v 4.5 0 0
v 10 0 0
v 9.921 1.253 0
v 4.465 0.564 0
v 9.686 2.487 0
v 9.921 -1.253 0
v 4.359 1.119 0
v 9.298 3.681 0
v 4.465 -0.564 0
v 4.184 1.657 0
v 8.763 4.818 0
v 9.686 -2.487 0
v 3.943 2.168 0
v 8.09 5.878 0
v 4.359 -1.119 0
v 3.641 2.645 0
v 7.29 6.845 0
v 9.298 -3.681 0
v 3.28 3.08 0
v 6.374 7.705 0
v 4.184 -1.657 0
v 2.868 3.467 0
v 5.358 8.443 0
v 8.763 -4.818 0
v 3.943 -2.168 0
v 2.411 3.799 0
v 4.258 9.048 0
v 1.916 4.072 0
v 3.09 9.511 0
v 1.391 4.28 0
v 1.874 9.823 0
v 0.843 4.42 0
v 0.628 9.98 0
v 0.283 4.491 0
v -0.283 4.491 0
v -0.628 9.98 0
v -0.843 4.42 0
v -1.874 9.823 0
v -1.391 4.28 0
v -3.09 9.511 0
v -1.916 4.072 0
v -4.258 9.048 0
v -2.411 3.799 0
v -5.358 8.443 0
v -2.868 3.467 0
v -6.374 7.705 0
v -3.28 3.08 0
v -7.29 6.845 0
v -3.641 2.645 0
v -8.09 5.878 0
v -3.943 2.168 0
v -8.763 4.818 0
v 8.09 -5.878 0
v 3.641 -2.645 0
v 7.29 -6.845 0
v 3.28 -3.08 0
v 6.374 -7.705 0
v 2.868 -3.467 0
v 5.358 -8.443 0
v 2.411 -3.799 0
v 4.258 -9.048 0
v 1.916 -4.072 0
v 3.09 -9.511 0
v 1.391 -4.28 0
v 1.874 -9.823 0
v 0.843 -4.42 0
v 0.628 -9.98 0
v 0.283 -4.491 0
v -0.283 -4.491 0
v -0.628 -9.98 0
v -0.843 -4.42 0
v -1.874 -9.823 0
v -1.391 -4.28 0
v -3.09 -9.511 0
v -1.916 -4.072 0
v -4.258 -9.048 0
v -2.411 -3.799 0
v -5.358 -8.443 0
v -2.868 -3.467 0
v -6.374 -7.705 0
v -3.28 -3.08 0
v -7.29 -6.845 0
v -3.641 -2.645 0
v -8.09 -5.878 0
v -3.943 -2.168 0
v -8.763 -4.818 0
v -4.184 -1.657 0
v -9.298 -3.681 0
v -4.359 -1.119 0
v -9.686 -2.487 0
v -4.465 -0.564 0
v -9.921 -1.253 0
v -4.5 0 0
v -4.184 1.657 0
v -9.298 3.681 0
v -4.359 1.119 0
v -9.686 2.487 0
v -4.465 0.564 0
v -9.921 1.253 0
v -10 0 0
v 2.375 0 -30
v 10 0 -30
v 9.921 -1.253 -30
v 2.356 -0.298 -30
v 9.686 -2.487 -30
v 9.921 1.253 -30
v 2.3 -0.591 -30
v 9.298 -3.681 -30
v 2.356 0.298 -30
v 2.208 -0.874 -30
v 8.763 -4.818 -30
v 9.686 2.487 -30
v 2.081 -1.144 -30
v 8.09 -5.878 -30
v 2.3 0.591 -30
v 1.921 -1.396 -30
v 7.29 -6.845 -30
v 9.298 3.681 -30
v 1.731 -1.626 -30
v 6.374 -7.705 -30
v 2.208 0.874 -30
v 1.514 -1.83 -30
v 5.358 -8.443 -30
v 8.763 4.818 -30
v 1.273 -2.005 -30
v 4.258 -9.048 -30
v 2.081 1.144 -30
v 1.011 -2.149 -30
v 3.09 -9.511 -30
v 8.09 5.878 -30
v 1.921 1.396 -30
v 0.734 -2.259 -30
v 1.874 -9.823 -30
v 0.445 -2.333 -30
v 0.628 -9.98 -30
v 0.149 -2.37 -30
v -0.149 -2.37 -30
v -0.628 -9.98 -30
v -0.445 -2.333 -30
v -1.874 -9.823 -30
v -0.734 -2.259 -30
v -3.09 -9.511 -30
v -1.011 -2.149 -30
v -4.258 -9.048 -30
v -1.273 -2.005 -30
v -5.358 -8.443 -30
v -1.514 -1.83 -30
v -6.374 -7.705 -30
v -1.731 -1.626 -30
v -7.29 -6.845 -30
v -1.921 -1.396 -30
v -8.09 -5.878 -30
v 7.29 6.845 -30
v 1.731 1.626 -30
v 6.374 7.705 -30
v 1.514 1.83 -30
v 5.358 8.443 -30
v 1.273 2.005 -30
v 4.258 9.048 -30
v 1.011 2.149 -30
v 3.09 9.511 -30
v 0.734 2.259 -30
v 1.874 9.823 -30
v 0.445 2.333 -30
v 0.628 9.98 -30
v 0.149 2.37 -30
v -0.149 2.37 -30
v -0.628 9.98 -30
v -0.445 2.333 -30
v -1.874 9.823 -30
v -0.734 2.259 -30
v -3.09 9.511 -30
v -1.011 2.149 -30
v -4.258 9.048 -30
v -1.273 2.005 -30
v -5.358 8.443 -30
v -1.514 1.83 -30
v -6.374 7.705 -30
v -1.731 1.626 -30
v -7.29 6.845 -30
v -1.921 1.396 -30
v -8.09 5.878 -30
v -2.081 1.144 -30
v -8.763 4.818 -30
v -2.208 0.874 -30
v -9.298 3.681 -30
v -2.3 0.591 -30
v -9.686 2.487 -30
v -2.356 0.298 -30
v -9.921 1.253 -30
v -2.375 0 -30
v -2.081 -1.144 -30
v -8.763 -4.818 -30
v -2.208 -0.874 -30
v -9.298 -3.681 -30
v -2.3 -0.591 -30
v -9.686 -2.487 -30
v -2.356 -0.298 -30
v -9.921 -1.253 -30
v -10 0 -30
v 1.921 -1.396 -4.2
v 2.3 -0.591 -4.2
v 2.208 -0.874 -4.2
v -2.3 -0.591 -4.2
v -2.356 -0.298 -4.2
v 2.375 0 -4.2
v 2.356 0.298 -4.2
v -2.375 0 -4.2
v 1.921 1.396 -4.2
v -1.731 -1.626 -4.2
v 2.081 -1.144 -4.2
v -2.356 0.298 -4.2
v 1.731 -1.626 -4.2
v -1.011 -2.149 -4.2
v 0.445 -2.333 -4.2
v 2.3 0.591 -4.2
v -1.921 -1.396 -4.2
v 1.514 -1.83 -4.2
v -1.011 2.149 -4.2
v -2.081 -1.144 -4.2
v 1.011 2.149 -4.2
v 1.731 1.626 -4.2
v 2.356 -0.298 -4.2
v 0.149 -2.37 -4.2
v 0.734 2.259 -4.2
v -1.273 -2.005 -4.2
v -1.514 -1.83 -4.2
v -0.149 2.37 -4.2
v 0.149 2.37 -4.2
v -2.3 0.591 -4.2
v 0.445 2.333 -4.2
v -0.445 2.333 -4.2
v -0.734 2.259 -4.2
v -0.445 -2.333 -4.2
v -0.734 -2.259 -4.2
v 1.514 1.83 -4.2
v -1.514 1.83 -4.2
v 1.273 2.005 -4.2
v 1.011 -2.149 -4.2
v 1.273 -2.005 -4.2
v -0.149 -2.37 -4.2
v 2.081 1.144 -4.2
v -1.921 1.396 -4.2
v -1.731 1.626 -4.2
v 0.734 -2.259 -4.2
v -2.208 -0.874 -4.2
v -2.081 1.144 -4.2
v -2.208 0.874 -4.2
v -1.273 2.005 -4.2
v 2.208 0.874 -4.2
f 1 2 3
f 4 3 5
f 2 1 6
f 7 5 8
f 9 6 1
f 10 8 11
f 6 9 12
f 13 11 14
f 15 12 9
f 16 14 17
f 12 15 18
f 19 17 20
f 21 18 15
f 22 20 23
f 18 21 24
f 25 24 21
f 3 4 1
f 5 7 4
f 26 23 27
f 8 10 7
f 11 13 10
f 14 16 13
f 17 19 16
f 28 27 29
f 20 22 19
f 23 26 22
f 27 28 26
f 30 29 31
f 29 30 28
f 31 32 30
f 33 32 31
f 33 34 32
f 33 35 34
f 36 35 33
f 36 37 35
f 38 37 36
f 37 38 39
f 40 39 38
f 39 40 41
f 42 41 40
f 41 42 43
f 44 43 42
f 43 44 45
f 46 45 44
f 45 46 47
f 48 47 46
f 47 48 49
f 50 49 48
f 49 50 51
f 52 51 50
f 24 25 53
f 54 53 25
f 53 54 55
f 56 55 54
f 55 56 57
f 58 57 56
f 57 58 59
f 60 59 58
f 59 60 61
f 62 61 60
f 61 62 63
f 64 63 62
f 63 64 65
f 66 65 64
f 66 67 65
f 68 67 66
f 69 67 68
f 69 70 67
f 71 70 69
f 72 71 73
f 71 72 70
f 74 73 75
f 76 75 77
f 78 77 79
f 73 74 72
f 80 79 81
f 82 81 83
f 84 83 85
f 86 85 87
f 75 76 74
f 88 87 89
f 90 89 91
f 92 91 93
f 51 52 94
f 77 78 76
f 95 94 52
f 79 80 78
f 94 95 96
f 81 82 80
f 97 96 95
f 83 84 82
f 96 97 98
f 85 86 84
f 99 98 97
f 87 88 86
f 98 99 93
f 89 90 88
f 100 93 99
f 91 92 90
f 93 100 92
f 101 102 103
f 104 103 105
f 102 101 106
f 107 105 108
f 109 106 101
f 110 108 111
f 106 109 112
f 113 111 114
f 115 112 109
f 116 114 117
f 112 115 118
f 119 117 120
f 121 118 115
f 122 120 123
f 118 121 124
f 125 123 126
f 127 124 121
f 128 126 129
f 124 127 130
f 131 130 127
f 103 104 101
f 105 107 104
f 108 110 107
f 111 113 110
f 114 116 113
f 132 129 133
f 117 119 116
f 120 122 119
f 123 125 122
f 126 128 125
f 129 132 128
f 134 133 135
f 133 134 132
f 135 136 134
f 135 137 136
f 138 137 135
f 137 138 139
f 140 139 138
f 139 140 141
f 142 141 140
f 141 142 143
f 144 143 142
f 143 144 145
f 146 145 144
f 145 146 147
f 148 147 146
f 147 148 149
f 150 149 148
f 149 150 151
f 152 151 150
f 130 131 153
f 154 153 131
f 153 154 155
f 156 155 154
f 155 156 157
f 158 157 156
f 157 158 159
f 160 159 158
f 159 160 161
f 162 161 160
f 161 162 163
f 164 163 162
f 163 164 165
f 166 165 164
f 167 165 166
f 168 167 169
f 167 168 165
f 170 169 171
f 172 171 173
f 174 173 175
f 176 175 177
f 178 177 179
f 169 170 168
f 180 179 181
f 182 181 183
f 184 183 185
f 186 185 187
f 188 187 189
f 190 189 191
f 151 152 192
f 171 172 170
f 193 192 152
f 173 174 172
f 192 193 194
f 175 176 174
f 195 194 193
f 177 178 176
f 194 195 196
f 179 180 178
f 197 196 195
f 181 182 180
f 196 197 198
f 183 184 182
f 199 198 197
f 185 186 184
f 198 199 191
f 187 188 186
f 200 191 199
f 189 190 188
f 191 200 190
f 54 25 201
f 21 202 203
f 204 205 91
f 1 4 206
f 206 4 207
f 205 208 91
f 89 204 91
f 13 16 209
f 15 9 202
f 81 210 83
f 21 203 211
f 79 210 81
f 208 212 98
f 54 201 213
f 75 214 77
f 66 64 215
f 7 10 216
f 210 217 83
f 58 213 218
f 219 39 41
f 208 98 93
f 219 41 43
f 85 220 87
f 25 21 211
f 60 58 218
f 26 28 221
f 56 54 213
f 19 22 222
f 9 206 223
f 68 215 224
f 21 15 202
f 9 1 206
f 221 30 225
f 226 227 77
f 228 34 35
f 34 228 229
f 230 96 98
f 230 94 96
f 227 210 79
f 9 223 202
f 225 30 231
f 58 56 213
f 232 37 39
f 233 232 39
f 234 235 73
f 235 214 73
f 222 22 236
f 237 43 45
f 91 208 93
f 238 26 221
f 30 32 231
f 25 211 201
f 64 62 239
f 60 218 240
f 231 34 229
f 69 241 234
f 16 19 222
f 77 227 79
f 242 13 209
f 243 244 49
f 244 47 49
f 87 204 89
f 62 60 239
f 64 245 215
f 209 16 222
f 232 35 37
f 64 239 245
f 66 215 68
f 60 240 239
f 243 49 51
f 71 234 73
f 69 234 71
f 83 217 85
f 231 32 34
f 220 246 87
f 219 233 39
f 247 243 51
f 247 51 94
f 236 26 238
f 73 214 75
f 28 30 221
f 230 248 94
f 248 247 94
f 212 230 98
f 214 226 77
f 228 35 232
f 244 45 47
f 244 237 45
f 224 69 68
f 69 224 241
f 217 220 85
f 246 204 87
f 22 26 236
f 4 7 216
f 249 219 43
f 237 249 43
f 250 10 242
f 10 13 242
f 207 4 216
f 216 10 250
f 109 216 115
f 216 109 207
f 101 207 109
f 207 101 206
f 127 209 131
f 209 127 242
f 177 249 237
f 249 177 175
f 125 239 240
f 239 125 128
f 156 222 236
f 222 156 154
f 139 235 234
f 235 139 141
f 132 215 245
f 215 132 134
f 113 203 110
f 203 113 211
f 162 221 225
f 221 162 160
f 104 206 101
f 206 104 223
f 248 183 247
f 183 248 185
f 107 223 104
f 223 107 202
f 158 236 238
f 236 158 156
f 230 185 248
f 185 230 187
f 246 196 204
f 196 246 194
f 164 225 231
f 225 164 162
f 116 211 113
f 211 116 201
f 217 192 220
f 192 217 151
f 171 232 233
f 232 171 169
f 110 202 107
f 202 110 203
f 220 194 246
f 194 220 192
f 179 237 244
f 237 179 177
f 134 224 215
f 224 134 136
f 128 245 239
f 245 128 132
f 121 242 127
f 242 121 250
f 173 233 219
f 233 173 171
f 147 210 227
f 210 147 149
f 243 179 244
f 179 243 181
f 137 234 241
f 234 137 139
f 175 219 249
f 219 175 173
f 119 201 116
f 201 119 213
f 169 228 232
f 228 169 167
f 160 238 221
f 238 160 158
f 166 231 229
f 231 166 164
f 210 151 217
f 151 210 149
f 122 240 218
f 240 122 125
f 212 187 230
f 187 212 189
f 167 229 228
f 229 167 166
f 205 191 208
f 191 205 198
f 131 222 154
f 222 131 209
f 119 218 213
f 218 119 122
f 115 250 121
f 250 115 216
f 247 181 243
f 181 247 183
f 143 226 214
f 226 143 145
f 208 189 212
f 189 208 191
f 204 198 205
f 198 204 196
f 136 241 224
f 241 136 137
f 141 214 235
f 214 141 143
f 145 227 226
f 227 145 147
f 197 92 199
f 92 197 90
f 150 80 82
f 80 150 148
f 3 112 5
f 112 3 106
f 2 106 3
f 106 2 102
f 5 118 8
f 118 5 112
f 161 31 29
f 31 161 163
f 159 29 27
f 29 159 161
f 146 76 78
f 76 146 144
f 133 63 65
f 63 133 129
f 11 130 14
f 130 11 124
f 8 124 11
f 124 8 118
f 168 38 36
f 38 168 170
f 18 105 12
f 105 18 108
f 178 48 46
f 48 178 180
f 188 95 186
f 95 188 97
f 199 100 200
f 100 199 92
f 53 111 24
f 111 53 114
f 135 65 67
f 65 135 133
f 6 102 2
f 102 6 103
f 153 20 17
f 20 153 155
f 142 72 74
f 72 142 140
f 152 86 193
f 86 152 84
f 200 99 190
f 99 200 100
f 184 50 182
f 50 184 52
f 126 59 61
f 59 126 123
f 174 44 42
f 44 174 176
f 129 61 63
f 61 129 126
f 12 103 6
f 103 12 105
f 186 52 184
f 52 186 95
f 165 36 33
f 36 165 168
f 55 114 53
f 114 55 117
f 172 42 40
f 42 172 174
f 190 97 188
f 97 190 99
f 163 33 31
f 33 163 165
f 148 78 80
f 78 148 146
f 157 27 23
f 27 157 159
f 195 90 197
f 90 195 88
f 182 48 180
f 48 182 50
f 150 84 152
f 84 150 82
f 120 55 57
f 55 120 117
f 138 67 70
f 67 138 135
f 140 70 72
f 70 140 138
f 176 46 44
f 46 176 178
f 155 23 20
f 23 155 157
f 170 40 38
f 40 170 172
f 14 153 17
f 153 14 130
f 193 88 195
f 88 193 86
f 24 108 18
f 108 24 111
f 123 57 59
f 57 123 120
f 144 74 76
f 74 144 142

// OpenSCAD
$fn = 50;


difference() {
	union() {
		translate(v = [0, 0, -30.0000000000]) {
			cylinder(h = 30, r = 10.0000000000);
		}
		cylinder(h = 0, r = 16.0000000000);
	}
	union() {
		translate(v = [0, 0, 0]) {
			rotate(a = [0, 0, 0]) {
				difference() {
					union() {
						#translate(v = [0, 0, -30.0000000000]) {
							cylinder(h = 30, r = 2.2500000000);
						}
						#translate(v = [0, 0, -4.2000000000]) {
							cylinder(h = 4.2000000000, r = 10.0000000000, r1 = 2.3750000000, r2 = 4.5000000000);
						}
						#translate(v = [0, 0, -30.0000000000]) {
							cylinder(h = 30, r = 2.3750000000);
						}
						#translate(v = [0, 0, -30.0000000000]) {
							cylinder(h = 30, r = 2.2500000000);
						}
					}
					union();
				}
			}
		}
	}
}
